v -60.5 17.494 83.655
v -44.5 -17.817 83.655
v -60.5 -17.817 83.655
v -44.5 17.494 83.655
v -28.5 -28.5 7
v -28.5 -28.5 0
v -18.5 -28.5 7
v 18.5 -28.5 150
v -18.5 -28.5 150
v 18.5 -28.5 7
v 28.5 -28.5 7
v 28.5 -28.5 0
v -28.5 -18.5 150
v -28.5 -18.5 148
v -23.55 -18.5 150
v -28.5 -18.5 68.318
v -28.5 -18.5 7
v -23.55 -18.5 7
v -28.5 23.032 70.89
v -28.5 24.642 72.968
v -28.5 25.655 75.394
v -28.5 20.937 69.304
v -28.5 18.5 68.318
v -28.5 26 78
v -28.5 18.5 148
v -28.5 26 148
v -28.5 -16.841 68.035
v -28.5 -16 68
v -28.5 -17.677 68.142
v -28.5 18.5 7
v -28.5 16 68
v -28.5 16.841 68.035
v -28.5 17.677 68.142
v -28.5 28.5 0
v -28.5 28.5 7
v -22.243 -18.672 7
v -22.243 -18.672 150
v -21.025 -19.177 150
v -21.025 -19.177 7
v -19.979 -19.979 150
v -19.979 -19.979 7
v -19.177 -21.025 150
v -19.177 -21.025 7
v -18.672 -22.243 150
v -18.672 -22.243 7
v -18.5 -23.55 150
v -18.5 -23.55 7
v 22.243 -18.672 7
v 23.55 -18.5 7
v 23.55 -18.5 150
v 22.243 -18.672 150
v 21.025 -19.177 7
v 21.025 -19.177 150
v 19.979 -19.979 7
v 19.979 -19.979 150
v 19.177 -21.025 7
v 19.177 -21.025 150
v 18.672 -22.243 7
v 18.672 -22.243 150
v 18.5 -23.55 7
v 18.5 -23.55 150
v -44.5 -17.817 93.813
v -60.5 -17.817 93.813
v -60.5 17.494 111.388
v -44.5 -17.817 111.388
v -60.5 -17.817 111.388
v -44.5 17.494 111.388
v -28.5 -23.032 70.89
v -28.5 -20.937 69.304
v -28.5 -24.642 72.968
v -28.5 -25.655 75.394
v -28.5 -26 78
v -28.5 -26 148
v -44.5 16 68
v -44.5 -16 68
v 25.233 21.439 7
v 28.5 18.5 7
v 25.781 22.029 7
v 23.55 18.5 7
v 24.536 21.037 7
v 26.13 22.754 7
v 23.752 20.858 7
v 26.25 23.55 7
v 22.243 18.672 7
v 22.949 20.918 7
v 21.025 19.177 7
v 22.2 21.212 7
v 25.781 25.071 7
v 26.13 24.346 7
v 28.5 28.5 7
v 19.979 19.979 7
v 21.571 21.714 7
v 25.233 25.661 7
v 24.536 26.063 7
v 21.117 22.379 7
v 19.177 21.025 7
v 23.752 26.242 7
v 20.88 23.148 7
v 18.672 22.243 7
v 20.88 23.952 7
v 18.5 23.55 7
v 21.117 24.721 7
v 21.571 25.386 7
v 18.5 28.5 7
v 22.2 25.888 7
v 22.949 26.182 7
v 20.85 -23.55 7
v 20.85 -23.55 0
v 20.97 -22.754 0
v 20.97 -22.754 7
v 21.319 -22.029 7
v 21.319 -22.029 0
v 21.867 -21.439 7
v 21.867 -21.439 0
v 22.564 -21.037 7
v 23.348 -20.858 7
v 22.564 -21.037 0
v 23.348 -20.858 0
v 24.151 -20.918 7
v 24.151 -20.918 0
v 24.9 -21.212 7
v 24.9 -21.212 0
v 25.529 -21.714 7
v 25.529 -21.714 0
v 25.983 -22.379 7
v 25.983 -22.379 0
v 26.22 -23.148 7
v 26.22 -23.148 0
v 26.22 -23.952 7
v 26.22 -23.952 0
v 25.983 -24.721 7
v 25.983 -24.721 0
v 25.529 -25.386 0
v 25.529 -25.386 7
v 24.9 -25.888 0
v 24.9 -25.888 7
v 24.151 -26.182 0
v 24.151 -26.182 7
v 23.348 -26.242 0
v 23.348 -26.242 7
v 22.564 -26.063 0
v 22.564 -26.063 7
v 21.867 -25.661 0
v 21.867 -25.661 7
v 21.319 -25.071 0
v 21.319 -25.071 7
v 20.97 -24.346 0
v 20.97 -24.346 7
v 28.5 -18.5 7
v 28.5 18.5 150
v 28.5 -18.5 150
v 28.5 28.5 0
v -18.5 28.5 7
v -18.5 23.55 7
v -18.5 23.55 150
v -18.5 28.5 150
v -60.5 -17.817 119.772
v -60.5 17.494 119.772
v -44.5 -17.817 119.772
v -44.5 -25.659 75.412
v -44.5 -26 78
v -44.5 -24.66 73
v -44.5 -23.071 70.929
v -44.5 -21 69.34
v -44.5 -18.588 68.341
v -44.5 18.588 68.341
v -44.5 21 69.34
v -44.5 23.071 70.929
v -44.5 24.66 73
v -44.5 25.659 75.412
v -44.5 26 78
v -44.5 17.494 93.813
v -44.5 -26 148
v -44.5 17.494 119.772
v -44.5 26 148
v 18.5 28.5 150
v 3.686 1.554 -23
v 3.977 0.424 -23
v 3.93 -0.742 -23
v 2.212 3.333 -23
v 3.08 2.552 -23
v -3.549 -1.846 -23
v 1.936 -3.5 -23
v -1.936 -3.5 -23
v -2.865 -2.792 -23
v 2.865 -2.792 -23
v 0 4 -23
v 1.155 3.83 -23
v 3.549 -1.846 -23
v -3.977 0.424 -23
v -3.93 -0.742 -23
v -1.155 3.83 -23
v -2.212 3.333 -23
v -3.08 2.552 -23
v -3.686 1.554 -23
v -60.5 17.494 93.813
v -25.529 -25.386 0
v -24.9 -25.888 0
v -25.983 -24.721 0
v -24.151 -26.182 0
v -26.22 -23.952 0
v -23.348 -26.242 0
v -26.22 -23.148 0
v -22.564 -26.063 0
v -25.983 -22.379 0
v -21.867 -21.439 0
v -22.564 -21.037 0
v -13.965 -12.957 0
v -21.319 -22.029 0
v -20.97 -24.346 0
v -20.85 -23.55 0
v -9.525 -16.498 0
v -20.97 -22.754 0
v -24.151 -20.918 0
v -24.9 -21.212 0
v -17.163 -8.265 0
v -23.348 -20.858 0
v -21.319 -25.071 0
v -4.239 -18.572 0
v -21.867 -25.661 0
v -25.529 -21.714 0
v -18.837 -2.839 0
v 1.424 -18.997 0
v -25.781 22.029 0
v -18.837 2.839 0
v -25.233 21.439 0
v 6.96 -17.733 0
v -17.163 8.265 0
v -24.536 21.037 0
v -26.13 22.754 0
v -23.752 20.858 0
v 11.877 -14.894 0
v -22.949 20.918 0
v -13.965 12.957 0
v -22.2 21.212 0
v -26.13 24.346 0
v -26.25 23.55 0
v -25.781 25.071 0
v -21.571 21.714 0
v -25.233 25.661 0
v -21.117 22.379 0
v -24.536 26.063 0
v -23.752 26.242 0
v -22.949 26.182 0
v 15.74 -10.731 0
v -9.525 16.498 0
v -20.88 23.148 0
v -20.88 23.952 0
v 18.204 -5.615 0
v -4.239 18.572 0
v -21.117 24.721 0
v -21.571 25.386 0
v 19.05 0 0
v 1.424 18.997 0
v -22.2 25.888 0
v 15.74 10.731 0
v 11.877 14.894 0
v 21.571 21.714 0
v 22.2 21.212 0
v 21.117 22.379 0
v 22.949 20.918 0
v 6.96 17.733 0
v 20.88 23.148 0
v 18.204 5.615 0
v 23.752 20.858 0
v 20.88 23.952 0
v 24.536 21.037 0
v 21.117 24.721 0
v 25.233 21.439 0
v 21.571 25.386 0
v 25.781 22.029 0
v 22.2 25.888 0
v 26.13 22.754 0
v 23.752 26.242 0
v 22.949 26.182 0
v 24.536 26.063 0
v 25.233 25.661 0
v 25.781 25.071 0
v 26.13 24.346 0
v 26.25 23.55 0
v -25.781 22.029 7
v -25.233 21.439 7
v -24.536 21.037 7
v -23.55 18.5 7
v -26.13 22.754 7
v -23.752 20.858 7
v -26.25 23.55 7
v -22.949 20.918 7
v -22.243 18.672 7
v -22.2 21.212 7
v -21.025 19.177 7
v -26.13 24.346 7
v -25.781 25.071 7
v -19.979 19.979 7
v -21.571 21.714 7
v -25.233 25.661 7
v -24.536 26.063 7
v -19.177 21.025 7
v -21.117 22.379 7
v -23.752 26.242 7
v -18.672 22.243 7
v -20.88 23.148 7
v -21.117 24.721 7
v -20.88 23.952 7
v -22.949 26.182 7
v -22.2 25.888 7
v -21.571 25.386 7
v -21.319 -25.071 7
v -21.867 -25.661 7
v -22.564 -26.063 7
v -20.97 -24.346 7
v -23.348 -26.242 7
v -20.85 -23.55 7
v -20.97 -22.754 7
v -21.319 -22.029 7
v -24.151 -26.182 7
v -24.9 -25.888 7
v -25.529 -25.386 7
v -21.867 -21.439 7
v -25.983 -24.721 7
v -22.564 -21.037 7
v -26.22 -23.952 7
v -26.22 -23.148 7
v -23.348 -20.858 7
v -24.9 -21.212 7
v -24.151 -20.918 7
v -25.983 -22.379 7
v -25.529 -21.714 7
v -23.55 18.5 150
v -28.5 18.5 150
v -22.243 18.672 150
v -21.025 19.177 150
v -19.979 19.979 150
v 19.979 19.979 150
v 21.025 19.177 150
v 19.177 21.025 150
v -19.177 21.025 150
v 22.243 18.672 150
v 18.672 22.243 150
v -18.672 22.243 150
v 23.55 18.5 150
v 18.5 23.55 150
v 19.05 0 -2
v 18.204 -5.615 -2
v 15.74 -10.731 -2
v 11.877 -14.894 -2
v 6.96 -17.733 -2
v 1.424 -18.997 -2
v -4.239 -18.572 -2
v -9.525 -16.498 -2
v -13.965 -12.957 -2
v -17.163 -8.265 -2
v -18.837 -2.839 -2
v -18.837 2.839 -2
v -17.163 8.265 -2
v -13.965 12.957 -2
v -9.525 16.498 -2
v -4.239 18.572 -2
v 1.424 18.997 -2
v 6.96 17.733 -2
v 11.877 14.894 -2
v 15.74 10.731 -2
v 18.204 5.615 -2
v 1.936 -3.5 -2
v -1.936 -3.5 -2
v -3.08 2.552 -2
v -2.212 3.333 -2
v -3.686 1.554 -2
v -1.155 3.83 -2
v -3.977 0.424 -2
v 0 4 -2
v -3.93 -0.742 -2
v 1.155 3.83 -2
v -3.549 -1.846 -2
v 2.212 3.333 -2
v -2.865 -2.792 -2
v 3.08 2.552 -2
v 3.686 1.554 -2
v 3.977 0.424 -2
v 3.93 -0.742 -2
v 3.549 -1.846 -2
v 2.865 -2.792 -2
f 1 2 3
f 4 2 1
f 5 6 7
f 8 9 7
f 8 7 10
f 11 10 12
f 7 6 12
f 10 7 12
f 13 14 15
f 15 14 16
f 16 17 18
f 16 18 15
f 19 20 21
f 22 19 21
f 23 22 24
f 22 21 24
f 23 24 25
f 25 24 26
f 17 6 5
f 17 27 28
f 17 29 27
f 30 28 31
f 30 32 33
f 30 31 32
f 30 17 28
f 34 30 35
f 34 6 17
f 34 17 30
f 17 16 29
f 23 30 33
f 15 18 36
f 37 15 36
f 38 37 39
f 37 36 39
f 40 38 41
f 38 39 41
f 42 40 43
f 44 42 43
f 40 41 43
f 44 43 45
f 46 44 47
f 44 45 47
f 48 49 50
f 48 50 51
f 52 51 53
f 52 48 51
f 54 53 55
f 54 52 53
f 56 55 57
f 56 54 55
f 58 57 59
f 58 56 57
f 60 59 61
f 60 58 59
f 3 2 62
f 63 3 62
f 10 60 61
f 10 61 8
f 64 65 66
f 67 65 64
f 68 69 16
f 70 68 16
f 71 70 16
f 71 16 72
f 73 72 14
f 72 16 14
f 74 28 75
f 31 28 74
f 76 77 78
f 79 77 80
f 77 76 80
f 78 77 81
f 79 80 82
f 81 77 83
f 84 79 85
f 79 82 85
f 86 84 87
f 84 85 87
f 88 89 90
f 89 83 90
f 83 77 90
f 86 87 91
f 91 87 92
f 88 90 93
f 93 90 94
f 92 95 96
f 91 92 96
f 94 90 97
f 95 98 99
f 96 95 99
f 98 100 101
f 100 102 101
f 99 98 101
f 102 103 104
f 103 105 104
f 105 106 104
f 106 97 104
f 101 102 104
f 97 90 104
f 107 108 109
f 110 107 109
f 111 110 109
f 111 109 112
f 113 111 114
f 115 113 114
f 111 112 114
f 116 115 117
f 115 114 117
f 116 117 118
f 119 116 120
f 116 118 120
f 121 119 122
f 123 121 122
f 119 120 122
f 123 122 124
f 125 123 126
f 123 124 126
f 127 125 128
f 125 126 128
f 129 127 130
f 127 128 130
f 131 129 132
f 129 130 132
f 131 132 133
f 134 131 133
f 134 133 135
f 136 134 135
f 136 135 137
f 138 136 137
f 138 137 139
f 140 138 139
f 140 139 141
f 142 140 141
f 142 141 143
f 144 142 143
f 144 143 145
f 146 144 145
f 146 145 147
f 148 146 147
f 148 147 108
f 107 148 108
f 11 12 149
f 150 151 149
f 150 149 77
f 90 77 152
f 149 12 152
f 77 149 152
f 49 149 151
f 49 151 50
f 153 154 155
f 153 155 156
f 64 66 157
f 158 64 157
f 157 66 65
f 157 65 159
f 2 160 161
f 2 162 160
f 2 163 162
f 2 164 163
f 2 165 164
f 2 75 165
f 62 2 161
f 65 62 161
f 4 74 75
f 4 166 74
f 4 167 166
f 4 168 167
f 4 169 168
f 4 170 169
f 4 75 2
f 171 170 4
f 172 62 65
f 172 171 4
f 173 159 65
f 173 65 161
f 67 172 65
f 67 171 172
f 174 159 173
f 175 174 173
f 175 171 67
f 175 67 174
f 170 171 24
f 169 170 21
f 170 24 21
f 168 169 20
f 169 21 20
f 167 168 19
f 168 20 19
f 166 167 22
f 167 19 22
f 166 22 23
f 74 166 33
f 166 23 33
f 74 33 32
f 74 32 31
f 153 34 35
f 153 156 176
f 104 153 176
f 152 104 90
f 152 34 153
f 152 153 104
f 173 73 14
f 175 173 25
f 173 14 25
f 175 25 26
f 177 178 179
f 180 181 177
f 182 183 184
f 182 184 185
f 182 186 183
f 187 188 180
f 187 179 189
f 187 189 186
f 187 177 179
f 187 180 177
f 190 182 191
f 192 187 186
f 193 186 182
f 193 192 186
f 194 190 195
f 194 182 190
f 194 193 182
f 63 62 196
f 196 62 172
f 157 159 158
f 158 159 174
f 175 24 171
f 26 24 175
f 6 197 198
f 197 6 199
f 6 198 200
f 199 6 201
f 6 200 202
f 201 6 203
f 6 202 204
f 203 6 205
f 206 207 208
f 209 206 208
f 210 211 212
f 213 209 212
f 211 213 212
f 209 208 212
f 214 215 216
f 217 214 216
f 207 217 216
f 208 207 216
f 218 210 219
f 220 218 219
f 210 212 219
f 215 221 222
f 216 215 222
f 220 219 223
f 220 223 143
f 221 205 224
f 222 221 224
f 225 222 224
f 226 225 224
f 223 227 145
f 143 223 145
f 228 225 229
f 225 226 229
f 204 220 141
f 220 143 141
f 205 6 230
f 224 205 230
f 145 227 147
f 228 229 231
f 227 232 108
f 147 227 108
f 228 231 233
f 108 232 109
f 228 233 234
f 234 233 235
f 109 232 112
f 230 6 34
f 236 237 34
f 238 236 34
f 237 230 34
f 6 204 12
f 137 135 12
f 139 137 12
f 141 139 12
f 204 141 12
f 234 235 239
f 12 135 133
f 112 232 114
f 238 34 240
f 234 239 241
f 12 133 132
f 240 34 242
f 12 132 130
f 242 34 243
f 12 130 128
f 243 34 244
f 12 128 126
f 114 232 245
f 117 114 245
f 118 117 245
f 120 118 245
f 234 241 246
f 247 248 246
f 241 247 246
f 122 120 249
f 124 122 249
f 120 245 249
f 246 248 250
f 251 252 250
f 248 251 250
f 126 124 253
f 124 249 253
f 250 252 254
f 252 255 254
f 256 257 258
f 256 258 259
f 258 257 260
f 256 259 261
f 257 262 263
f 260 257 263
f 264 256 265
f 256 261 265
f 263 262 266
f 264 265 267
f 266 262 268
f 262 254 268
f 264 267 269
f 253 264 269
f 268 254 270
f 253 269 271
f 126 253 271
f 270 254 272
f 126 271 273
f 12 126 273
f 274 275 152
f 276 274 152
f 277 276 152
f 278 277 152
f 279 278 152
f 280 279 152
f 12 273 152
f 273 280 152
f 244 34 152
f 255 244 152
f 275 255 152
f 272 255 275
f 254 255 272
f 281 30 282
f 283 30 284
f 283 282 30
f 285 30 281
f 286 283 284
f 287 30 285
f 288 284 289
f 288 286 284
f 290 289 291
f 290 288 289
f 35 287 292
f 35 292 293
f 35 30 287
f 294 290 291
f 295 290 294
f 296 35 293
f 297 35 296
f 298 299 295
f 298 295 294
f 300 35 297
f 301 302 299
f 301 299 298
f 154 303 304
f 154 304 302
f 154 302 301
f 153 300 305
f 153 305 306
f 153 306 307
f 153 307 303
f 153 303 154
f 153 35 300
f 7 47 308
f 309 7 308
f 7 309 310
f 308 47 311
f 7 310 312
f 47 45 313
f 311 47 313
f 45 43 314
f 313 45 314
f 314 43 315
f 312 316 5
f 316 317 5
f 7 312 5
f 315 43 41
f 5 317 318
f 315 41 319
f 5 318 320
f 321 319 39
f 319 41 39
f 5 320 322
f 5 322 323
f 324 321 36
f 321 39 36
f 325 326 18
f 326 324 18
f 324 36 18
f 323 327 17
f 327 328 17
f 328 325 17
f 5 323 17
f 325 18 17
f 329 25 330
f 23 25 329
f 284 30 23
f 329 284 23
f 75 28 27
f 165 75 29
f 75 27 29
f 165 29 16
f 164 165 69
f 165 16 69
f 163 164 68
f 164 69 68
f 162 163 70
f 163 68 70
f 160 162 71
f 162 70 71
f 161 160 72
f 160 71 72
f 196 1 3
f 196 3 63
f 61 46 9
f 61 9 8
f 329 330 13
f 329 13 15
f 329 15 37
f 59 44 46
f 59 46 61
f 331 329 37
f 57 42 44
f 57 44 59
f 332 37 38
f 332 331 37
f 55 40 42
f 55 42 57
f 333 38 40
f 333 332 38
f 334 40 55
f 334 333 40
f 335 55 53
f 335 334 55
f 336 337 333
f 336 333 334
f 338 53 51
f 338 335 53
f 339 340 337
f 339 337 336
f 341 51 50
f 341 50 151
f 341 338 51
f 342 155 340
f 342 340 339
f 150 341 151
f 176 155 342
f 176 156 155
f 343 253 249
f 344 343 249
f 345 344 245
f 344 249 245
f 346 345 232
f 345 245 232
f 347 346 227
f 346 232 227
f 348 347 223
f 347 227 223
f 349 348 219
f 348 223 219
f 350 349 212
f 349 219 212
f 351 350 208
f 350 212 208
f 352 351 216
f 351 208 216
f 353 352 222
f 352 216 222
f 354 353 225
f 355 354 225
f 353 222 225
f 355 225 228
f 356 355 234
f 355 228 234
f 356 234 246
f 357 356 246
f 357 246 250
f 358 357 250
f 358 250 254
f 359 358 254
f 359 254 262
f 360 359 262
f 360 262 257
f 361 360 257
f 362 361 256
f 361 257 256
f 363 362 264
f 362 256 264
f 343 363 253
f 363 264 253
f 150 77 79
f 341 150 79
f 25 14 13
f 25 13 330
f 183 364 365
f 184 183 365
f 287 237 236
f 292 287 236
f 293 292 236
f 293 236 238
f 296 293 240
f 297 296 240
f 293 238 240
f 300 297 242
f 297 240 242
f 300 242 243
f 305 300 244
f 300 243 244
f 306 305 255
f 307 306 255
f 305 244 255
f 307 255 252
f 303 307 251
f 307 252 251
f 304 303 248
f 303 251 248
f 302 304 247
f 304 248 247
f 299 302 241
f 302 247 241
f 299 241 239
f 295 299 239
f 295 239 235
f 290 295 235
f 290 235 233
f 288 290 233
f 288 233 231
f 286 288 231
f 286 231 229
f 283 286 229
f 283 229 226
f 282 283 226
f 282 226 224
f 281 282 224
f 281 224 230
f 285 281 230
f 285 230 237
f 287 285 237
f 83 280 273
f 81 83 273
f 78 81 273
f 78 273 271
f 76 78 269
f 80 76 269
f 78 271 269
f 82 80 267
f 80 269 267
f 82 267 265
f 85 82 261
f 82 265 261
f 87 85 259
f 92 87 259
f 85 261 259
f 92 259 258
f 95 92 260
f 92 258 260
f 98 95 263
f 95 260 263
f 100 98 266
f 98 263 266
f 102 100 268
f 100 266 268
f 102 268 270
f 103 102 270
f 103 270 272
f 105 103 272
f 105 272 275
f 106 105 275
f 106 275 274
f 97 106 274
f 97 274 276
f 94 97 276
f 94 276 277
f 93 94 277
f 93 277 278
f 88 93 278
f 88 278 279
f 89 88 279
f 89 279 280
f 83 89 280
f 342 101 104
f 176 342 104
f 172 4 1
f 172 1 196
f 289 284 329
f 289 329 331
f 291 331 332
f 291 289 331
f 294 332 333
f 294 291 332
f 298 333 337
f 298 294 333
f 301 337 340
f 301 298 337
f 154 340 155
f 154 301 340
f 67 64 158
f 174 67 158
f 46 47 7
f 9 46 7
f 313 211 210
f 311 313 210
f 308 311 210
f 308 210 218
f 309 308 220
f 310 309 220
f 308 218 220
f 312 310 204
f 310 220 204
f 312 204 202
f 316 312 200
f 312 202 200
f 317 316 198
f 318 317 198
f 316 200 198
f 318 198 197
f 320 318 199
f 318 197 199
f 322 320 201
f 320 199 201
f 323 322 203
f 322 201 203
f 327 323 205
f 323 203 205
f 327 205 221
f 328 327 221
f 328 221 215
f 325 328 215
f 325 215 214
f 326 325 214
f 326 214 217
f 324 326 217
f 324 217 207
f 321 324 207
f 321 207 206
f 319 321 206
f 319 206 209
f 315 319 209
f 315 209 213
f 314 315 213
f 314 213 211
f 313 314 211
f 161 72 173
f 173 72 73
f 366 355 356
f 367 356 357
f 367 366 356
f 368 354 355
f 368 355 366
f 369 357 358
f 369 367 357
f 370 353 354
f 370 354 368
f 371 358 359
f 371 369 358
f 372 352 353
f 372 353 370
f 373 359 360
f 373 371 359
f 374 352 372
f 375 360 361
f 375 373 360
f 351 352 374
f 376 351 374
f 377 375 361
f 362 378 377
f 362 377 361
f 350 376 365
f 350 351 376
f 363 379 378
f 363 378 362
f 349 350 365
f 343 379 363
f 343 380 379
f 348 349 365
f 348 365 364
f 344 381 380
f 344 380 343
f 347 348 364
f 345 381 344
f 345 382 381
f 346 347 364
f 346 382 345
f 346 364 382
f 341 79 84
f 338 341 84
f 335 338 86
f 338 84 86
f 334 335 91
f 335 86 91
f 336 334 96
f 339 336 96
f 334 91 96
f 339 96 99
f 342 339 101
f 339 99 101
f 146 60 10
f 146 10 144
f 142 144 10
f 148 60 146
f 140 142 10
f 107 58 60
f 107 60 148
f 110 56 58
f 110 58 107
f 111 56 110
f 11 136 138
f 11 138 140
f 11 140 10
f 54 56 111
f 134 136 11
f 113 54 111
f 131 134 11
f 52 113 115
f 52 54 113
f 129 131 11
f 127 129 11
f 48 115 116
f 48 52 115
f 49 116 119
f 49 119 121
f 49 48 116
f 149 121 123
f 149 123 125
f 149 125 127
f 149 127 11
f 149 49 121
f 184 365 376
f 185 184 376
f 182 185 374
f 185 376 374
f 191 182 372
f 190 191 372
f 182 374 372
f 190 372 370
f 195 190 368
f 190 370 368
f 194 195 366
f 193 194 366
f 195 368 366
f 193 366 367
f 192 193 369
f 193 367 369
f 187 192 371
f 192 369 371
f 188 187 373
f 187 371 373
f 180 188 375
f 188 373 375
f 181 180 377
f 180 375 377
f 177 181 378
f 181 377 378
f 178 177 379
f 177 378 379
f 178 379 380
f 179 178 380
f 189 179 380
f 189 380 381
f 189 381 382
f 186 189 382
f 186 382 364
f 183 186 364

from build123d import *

# Parameters (mm, degrees)
SKIZZE1_W                       = 57
SKIZZE1_H                       = 57
AUFSATZ_LINEAR_AUSTRAGEN1_DEPTH = 150
SKIZZE2_R                       = 19.05
AUFSATZ_LINEAR_AUSTRAGEN2_DEPTH = 2
AUFSATZ_LINEAR_AUSTRAGEN3_DEPTH = 21
SKIZZE4_R                       = 2.7
SCHNITT_LINEAR_AUSTRAGEN1_DEPTH = 50
SCHNITT_LINEAR_START            = -7
SCHNITT_LINEAR_AUSTRAGEN2_DEPTH = 170
SKIZZE6_W                       = 80
SKIZZE6_H                       = 52
AUFSATZ_LINEAR_AUSTRAGEN4_DEPTH = 16
VERRUNDUNG1_R                   = 10
SKIZZE7_W                       = 10.157968888
SKIZZE7_H                       = 35.311034703
SKIZZE7_W_2                     = 8.384355272
AUFSATZ_LINEAR_AUSTRAGEN5_DEPTH = 16


with BuildPart() as part:
    # Skizze1 → Aufsatz-Linear austragen1 (new body)
    with BuildSketch(Plane.XY):
        Rectangle(SKIZZE1_W, SKIZZE1_H)
    extrude(amount=AUFSATZ_LINEAR_AUSTRAGEN1_DEPTH)

    # Skizze2 → Aufsatz-Linear austragen2 (add)
    with BuildSketch(Plane(origin=(0, 0, 0), x_dir=(-1, 0, 0), z_dir=(0, 0, -1))):
        with Locations(Location((0, 0, 0), (0, 0, 180))):
            Circle(SKIZZE2_R)
    extrude(amount=AUFSATZ_LINEAR_AUSTRAGEN2_DEPTH)

    # Skizze3 → Aufsatz-Linear austragen3 (add)
    with BuildSketch(Plane(origin=(0, 0, -2), x_dir=(-1, 0, 0), z_dir=(0, 0, -1))):
        with BuildLine():
            Line((-1.936491673, -3.5), (1.936491673, -3.5))
            ThreePointArc((1.936491673, -3.5), (0, 4), (-1.936491673, -3.5))
        make_face()
    extrude(amount=AUFSATZ_LINEAR_AUSTRAGEN3_DEPTH)

    # Skizze4 → Schnitt-Linear austragen1 (cut)
    with BuildSketch(Plane(origin=(0, 0, 0), x_dir=(-1, 0, 0), z_dir=(0, 0, -1))):
        with Locations((23.55, 23.55)):
            Circle(SKIZZE4_R)
        with Locations(Location((-23.55, 23.55, 0), (0, 0, 180))):
            Circle(SKIZZE4_R)
        with Locations(Location((23.55, -23.55, 0), (0, 0, 180))):
            Circle(SKIZZE4_R)
        with Locations((-23.55, -23.55)):
            Circle(SKIZZE4_R)
    extrude(amount=-SCHNITT_LINEAR_AUSTRAGEN1_DEPTH, mode=Mode.SUBTRACT)

    # Skizze5 → Schnitt-Linear austragen2 (cut)
    with BuildSketch(Plane(origin=(0, 0, 0), x_dir=(-1, 0, 0), z_dir=(0, 0, -1)).offset(SCHNITT_LINEAR_START)):
        with BuildLine():
            Line((18.5, 23.55), (18.5, 28.5))
            Line((18.5, 28.5), (28.5, 28.5))
            Line((28.5, 28.5), (28.5, 18.5))
            Line((28.5, 18.5), (23.55, 18.5))
            ThreePointArc((23.55, 18.5), (19.979110755, 19.979110755), (18.5, 23.55))
        make_face()
        with BuildLine():
            Line((-28.5, 28.5), (-28.5, 18.5))
            Line((-28.5, 18.5), (-23.55, 18.5))
            ThreePointArc((-23.55, 18.5), (-19.979110755, 19.979110755), (-18.5, 23.55))
            Line((-18.5, 23.55), (-18.5, 28.5))
            Line((-18.5, 28.5), (-28.5, 28.5))
        make_face()
        with BuildLine():
            Line((28.5, -18.5), (23.55, -18.5))
            ThreePointArc((23.55, -18.5), (19.979110755, -19.979110755), (18.5, -23.55))
            Line((18.5, -23.55), (18.5, -28.5))
            Line((18.5, -28.5), (28.5, -28.5))
            Line((28.5, -28.5), (28.5, -18.5))
        make_face()
        with BuildLine():
            Line((-28.5, -18.5), (-23.55, -18.5))
            ThreePointArc((-23.55, -18.5), (-19.979110755, -19.979110755), (-18.5, -23.55))
            Line((-18.5, -23.55), (-18.5, -28.5))
            Line((-18.5, -28.5), (-28.5, -28.5))
            Line((-28.5, -28.5), (-28.5, -18.5))
        make_face()
    extrude(amount=-SCHNITT_LINEAR_AUSTRAGEN2_DEPTH, mode=Mode.SUBTRACT)

    # Skizze6 → Aufsatz-Linear austragen4 (add)
    with BuildSketch(Plane.ZY.offset(28.5)):
        with Locations((108, 0)):
            Rectangle(SKIZZE6_W, SKIZZE6_H)
    extrude(amount=AUFSATZ_LINEAR_AUSTRAGEN4_DEPTH)

    # Verrundung1
    # the kernel refuses this fillet: 10 mm, written as the material it takes off along each edge
    with BuildSketch(Plane(origin=(-28.5, 26, 68), x_dir=(0, -1, 0), z_dir=(-1, 0, 0))) as verrundung1_piece_1:
        with BuildLine():
            CenterArc((VERRUNDUNG1_R, VERRUNDUNG1_R), VERRUNDUNG1_R, 180, 90)
            Line((0, VERRUNDUNG1_R), (0, 0))
            Line((0, 0), (VERRUNDUNG1_R, 0))
        make_face()
    extrude(amount=41, mode=Mode.SUBTRACT)
    with BuildSketch(Plane(origin=(-28.5, -26, 68), x_dir=(0, 1, 0), z_dir=(-1, 0, 0))) as verrundung1_piece_2:
        with BuildLine():
            CenterArc((VERRUNDUNG1_R, -VERRUNDUNG1_R), VERRUNDUNG1_R, 90, 90)
            Line((0, -VERRUNDUNG1_R), (0, 0))
            Line((0, 0), (VERRUNDUNG1_R, 0))
        make_face()
    extrude(amount=41, mode=Mode.SUBTRACT)

    # Skizze7 → Aufsatz-Linear austragen5 (add)
    with BuildSketch(Plane.ZY.offset(44.5)):
        with Locations((88.733684617, -0.161237601)):
            Rectangle(SKIZZE7_W, SKIZZE7_H)
        with Locations((115.579745248, -0.161237601)):
            Rectangle(SKIZZE7_W_2, SKIZZE7_H)
    extrude(amount=AUFSATZ_LINEAR_AUSTRAGEN5_DEPTH)


solid = part.part
